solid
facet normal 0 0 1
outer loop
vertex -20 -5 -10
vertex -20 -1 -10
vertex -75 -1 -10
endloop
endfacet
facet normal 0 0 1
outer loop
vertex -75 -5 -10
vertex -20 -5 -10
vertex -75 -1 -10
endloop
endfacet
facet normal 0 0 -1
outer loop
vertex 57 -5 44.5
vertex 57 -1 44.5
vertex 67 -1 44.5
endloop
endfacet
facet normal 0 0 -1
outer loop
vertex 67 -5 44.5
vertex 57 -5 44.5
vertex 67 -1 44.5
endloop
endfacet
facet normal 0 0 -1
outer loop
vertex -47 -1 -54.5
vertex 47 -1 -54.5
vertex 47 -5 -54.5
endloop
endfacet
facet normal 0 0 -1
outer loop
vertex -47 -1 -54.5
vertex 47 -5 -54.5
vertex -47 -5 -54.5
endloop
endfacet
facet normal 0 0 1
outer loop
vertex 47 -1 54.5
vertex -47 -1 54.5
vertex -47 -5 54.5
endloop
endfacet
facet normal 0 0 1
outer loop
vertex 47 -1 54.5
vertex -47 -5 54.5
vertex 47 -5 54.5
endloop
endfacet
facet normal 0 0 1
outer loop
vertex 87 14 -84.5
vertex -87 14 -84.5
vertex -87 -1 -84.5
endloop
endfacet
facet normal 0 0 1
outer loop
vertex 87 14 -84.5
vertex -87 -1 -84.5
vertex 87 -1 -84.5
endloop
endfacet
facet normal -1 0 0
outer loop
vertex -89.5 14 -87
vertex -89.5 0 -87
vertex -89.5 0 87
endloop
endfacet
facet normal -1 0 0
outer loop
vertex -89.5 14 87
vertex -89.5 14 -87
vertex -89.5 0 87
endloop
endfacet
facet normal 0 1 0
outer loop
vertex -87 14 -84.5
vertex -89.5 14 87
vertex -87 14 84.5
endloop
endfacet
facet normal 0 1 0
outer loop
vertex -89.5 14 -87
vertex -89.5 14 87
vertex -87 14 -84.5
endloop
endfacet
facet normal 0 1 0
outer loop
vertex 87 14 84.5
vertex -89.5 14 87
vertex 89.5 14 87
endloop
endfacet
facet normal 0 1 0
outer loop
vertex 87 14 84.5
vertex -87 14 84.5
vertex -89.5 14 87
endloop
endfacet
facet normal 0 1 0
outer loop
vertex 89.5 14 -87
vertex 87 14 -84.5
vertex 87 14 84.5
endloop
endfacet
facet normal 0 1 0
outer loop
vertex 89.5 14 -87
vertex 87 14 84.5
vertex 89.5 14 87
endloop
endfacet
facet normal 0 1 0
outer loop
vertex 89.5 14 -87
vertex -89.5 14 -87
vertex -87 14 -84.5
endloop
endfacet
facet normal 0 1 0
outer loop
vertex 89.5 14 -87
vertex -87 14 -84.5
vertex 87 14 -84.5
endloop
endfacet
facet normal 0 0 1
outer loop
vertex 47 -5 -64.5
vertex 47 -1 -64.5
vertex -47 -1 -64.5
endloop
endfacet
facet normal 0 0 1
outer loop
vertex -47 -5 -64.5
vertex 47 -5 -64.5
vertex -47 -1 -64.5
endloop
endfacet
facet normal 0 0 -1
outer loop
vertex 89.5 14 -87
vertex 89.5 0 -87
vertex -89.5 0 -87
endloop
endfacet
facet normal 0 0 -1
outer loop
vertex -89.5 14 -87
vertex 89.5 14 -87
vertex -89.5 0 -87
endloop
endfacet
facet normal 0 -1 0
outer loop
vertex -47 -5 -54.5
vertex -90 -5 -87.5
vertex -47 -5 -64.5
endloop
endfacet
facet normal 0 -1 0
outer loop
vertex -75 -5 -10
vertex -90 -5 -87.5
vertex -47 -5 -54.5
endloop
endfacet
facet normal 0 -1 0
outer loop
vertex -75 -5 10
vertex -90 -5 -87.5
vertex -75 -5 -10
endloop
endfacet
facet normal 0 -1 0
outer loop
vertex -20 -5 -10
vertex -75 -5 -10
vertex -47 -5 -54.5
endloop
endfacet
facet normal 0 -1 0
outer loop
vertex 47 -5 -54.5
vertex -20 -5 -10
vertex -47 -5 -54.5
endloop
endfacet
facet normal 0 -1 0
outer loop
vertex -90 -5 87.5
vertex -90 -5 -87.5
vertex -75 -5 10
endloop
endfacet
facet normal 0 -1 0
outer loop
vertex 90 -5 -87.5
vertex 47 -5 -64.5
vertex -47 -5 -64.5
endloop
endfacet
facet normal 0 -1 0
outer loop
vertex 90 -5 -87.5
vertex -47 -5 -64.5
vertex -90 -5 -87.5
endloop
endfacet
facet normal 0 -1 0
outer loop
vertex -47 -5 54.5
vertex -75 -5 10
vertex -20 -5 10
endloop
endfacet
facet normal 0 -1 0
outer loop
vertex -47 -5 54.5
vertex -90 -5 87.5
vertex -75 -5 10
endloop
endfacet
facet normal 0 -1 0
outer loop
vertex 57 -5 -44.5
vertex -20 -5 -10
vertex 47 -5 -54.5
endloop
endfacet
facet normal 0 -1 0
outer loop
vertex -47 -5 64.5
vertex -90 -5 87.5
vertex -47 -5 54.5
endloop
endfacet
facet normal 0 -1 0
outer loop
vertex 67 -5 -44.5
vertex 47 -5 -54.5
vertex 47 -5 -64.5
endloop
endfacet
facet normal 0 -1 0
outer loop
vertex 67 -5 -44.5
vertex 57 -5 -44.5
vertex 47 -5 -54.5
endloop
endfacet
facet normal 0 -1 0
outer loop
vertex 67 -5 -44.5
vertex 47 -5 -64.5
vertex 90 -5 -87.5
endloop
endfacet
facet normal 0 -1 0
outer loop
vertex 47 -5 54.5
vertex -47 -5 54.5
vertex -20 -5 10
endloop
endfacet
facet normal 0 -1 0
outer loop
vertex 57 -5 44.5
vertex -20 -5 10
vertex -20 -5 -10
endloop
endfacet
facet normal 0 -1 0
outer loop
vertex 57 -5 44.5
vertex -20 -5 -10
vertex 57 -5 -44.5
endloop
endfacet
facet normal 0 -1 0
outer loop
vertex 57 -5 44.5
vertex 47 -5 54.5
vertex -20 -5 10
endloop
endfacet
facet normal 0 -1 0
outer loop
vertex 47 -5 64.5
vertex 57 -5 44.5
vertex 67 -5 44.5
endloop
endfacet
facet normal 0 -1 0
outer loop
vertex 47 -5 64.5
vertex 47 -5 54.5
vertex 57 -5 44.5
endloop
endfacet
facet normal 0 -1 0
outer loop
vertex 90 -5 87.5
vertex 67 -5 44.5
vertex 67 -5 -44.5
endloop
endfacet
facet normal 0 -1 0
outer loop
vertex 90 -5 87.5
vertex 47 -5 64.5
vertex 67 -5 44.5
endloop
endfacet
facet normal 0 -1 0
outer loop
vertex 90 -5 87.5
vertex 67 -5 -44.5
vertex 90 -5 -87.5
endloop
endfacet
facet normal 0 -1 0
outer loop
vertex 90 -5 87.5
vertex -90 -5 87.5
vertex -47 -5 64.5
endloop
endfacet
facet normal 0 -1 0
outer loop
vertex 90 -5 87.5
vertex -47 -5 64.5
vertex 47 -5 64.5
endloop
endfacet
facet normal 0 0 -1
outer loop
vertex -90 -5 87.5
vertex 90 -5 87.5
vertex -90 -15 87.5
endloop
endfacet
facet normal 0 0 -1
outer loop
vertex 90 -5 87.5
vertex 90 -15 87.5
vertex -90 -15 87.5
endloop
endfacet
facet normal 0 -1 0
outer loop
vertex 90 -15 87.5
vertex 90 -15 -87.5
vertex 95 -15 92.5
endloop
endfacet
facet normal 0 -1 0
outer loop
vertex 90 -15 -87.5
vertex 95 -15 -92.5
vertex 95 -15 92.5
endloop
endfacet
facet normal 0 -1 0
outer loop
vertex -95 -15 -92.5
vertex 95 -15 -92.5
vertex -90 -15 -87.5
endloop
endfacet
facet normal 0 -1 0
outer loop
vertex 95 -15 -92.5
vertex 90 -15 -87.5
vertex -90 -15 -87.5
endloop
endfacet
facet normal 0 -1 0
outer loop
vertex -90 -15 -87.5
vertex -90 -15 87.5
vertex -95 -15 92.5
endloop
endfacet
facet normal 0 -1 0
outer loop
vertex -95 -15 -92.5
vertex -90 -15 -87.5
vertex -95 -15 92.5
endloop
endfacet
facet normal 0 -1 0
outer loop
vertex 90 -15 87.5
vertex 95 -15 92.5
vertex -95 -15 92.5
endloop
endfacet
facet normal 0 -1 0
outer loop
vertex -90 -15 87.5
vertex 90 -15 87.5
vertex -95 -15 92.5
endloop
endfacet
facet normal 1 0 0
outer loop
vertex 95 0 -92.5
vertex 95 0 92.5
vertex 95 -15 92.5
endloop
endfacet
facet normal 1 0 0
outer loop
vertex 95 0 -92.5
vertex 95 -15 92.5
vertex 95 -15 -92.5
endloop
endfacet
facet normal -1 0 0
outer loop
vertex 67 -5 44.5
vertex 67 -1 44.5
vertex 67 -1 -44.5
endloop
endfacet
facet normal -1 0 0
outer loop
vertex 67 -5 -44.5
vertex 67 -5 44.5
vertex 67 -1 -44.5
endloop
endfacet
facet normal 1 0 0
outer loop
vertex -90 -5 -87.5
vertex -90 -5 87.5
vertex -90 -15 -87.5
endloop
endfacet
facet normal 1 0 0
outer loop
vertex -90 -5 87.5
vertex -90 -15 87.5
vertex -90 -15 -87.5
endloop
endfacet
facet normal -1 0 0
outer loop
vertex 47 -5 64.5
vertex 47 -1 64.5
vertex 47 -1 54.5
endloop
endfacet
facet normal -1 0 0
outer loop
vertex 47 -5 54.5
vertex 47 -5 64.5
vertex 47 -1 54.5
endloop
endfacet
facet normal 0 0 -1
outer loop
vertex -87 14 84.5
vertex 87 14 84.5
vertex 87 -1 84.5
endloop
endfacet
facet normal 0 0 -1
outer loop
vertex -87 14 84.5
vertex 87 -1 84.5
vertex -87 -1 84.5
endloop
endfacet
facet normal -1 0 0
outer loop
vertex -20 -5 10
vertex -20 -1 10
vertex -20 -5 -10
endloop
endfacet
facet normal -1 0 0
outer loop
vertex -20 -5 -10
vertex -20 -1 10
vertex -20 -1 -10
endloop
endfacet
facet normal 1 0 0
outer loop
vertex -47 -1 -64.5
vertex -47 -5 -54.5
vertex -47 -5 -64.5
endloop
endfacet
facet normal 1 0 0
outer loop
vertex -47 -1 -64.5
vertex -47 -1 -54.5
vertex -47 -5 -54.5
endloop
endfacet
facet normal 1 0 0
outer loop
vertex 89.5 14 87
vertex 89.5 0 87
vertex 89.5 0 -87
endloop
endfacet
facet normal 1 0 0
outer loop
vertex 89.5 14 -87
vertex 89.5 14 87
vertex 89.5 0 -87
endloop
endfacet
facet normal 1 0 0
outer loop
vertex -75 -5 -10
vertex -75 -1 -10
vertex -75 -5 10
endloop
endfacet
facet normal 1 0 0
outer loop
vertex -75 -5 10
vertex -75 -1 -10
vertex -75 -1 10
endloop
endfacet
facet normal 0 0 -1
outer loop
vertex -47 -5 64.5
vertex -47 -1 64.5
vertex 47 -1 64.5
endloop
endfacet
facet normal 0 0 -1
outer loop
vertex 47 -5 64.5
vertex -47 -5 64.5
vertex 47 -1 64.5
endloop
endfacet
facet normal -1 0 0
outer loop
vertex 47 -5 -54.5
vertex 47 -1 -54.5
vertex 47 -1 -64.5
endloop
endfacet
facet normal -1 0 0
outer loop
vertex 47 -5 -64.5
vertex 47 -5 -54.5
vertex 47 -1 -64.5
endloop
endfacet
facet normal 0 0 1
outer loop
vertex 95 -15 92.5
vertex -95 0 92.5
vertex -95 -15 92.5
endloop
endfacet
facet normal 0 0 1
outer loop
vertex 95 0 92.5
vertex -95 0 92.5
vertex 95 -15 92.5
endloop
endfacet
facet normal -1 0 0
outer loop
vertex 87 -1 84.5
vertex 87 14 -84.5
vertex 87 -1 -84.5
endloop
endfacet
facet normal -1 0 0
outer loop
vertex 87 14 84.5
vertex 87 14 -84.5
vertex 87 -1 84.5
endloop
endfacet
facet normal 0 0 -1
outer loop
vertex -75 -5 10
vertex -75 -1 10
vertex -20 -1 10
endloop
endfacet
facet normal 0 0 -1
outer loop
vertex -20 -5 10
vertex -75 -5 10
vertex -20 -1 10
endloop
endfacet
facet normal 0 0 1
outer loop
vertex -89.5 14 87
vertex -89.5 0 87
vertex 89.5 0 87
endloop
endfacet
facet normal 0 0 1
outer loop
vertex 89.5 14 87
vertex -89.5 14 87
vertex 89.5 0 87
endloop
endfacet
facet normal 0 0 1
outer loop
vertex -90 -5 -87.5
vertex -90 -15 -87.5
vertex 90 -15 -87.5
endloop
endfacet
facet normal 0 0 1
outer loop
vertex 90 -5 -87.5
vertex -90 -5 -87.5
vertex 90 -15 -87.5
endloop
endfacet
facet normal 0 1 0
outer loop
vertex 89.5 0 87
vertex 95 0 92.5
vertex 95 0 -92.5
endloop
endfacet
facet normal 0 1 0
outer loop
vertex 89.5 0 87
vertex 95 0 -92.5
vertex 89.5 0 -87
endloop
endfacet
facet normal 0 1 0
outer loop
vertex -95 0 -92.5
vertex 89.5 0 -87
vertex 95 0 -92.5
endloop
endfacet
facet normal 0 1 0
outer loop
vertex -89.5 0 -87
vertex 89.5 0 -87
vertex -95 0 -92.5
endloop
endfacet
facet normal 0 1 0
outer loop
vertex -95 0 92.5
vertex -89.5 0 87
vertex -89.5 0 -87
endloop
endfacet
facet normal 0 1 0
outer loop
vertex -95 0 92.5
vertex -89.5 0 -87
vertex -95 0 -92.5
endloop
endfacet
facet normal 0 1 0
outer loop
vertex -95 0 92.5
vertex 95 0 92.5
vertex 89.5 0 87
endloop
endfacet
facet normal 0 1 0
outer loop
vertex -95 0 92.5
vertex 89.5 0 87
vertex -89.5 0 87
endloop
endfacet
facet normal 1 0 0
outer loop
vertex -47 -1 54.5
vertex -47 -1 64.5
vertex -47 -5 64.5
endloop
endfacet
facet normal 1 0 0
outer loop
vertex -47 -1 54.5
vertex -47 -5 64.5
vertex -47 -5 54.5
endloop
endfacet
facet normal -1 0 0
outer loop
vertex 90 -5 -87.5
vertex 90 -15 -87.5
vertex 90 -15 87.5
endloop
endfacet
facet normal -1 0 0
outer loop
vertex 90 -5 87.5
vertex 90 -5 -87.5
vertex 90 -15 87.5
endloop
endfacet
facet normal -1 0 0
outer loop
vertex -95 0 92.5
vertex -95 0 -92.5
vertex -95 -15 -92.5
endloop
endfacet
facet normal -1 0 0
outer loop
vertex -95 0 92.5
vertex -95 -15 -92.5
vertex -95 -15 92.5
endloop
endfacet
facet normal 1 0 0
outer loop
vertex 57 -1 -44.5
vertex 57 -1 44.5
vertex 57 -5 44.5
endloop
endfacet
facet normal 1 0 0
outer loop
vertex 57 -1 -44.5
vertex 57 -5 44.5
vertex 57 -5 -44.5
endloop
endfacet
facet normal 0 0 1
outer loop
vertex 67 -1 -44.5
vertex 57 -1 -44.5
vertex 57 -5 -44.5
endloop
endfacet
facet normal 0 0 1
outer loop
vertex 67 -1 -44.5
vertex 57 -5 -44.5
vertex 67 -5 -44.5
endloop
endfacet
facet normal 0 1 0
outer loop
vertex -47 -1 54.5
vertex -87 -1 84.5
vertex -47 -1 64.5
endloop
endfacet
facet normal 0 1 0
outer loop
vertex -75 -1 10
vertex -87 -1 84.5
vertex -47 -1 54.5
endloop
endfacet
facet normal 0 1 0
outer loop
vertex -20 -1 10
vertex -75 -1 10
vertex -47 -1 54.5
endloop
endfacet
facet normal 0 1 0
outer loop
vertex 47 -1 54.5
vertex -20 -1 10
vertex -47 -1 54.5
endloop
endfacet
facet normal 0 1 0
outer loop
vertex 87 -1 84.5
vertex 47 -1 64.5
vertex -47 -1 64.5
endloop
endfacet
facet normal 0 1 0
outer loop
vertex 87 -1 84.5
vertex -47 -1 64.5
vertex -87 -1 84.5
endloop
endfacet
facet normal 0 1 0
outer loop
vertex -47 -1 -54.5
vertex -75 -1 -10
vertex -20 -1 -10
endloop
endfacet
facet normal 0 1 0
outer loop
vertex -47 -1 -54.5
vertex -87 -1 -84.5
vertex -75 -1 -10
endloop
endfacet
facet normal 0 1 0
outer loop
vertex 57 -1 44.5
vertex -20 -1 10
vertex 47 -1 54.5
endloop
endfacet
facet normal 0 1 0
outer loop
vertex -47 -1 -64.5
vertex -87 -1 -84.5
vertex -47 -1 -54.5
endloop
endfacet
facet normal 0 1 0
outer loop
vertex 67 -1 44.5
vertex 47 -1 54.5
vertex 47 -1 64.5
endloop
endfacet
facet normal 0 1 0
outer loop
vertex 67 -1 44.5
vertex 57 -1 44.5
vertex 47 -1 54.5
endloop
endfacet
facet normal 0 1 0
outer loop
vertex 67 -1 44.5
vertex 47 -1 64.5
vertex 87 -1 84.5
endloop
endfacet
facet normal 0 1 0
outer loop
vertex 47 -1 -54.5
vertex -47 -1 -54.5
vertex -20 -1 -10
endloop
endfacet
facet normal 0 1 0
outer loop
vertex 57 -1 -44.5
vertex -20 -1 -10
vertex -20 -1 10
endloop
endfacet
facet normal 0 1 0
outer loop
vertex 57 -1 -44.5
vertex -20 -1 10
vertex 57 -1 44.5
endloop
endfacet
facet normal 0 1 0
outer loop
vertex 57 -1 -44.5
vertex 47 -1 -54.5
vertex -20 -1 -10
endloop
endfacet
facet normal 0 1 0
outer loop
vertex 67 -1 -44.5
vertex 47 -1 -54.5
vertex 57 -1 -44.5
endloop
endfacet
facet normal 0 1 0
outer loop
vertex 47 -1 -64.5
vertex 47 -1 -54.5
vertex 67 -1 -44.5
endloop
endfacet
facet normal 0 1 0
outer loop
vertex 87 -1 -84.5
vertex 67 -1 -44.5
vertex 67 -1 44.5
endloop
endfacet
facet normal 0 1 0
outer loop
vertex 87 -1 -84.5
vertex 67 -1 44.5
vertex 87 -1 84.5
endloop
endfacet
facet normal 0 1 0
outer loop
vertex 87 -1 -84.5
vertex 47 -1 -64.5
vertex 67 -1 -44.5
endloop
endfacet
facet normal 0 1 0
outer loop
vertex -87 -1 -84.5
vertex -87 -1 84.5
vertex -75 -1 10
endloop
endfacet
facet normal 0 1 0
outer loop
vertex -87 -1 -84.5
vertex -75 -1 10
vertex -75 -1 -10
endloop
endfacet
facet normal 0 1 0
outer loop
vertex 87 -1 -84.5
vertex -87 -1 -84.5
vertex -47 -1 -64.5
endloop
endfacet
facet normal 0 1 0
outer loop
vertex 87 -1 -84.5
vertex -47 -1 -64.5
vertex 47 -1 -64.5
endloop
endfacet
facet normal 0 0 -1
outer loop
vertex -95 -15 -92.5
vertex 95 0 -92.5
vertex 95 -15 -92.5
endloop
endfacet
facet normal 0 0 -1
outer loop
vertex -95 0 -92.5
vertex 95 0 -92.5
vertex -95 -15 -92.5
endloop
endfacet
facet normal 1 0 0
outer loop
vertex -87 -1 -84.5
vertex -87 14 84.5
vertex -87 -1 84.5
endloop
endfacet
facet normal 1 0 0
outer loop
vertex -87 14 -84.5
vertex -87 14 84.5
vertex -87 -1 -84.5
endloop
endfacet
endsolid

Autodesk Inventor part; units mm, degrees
ref_plane "YZ Plane" through (0, 0, 0) normal (1, 0, 0) x (0, 1, 0)
ref_plane "XZ Plane" through (0, 0, 0) normal (0, 1, 0) x (-1, 0, 0)
ref_plane "XY Plane" through (0, 0, 0) normal (0, 0, 1) x (1, 0, 0)
sketch "Sketch1" plane through (0, 0, 0) normal (0, 1, 0) x (-1, 0, 0)
  line L0 (95, 92.5) -> (-95, 92.5)
  line L1 (-95, 92.5) -> (-95, -92.5)
  line L2 (-95, -92.5) -> (95, -92.5)
  line L3 (95, -92.5) -> (95, 92.5)
  point P0 (0, 0)
  dimension "d0" = 190
  dimension "d1" = 185
  dimension "d2" = 92.5
  dimension "d3" = 95
extrude "Extrusion1" add sketch "Sketch1" against normal blind 15
sketch "Sketch5" plane through (0, 0, 0) normal (0, 1, 0) x (1, 0, 0)
  line L0 (-95, -92.5) -> (95, -92.5) projected
  line L1 (95, -92.5) -> (95, 92.5) projected
  line L2 (95, 92.5) -> (-95, 92.5) projected
  line L3 (-95, 92.5) -> (-95, -92.5) projected
  line L4 (-89.5, -87) -> (89.5, -87)
  line L5 (89.5, -87) -> (89.5, 87)
  line L6 (89.5, 87) -> (-89.5, 87)
  line L7 (-89.5, 87) -> (-89.5, -87)
  point P0 (0, 0)
  dimension "d42" = 5.5
  dimension "d43" = 5.5
  dimension "d44" = 5.5
  dimension "d45" = 5.5
extrude "Extrusion6" add sketch "Sketch5" along normal blind 14 contours L7 L6 L5 L4
sketch "Sketch6" plane through (0, 14, 0) normal (0, 1, 0) x (1, 0, 0)
  line L0 (-89.5, -87) -> (89.5, -87) projected
  line L1 (89.5, -87) -> (89.5, 87) projected
  line L2 (89.5, 87) -> (-89.5, 87) projected
  line L3 (-89.5, 87) -> (-89.5, -87) projected
  line L4 (87, -84.5) -> (-87, -84.5)
  line L5 (-87, -84.5) -> (-87, 84.5)
  line L6 (-87, 84.5) -> (87, 84.5)
  line L7 (87, 84.5) -> (87, -84.5)
  point P0 (0, 0)
  dimension "d48" = 2.5
  dimension "d49" = 2.5
  dimension "d50" = 2.5
  dimension "d51" = 2.5
extrude "Extrusion7" cut sketch "Sketch6" against normal blind 15 contours L4 L5 L6 L7
sketch "Sketch7" plane through (0, -15, 0) normal (0, -1, 0) x (1, 0, 0)
  line L0 (95, 92.5) -> (-95, 92.5) projected
  line L1 (-95, 92.5) -> (-95, -92.5) projected
  line L2 (-95, -92.5) -> (95, -92.5) projected
  line L3 (95, -92.5) -> (95, 92.5) projected
  line L4 (90, 87.5) -> (-90, 87.5)
  line L5 (-90, 87.5) -> (-90, -87.5)
  line L6 (-90, -87.5) -> (90, -87.5)
  line L7 (90, -87.5) -> (90, 87.5)
  point P0 (0, 0)
  dimension "d54" = 5
  dimension "d55" = 5
  dimension "d56" = 5
  dimension "d57" = 5
extrude "Extrusion8" cut sketch "Sketch7" against normal blind 10 contours L7 L6 L5 L4
sketch "Sketch8" plane through (0, -1, 0) normal (0, 1, 0) x (1, 0, 0)
  line L0 (87, -84.5) -> (-87, -84.5) projected
  line L1 (87, 84.5) -> (87, -84.5) projected
  line L2 (-87, 84.5) -> (87, 84.5) projected
  line L3 (-87, -84.5) -> (-87, 84.5) projected
  line L4 (-67, -64.5) -> (67, -64.5)
  line L5 (67, -64.5) -> (67, 64.5)
  line L6 (67, 64.5) -> (-67, 64.5)
  line L7 (-67, 64.5) -> (-67, -64.5)
  line L8 (-57, -54.5) -> (57, -54.5)
  line L9 (57, -54.5) -> (57, 54.5)
  line L10 (57, 54.5) -> (-57, 54.5)
  line L11 (-57, 54.5) -> (-57, -54.5)
  line L12 (-67, -44.5) -> (-57, -44.5)
  line L13 (-47, -64.5) -> (-47, -54.5)
  line L14 (-67, 44.5) -> (-57, 44.5)
  line L15 (-47, 54.5) -> (-47, 64.5)
  line L16 (47, -64.5) -> (47, -54.5)
  line L17 (57, -44.5) -> (67, -44.5)
  line L18 (47, 54.5) -> (47, 64.5)
  line L19 (57, 44.5) -> (67, 44.5)
  point P0 (0, 0)
  dimension "d60" = 20
  dimension "d61" = 20
  dimension "d62" = 20
  dimension "d63" = 20
  dimension "d64" = 10
  dimension "d65" = 10
  dimension "d66" = 10
  dimension "d67" = 10
  dimension "d68" = 20
  dimension "d69" = 20
  dimension "d70" = 20
  dimension "d71" = 20
  dimension "d72" = 20
  dimension "d73" = 20
  dimension "d74" = 20
  dimension "d75" = 20
extrude "Extrusion9" cut sketch "Sketch8" against normal through all contours L13 L8 L16 L4 | L17 L9 L19 L5 | L6 L18 L10 L15
sketch "Sketch9" plane through (0, -1, 0) normal (0, 1, 0) x (1, 0, 0)
  line L0 (47, -54.5) -> (47, -64.5) projected
  line L1 (47, -64.5) -> (-47, -64.5) projected
  line L2 (-47, -64.5) -> (-47, -54.5) projected
  line L3 (-47, -54.5) -> (47, -54.5) projected
  line L4 (67, 44.5) -> (67, -44.5) projected
  line L5 (67, -44.5) -> (57, -44.5) projected
  line L6 (57, -44.5) -> (57, 44.5) projected
  line L7 (57, 44.5) -> (67, 44.5) projected
  line L8 (47, 64.5) -> (47, 54.5) projected
  line L9 (47, 54.5) -> (-47, 54.5) projected
  line L10 (-47, 54.5) -> (-47, 64.5) projected
  line L11 (-47, 64.5) -> (47, 64.5) projected
  line L12 (87, -84.5) -> (-87, -84.5) projected
  line L13 (87, 84.5) -> (87, -84.5) projected
  line L14 (-87, 84.5) -> (87, 84.5) projected
  line L15 (-87, -84.5) -> (-87, 84.5) projected
  line L16 (-75, -10) -> (-20, -10)
  line L17 (-20, -10) -> (-20, 10)
  line L18 (-20, 10) -> (-75, 10)
  line L19 (-75, 10) -> (-75, -10)
  point P0 (0, 0)
  dimension "d78" = 55
  dimension "d79" = 20
  dimension "d80" = 20
  dimension "d81" = 10
extrude "Extrusion10" cut sketch "Sketch9" against normal through all contours L19 L18 L17 L16
equation "\"d2\" = 0.5 * d1"
equation "\"d3\" = 0.5 * d0"
equation "\"d43\" = d42"
equation "\"d44\" = d42"
equation "\"d45\" = d42"
equation "\"d49\" = d48"
equation "\"d50\" = d48"
equation "\"d51\" = d48"
equation "\"d55\" = d54"
equation "\"d56\" = d54"
equation "\"d57\" = d54"
equation "\"d61\" = d60"
equation "\"d62\" = d60"
equation "\"d63\" = d60"
equation "\"d65\" = d64"
equation "\"d66\" = d64"
equation "\"d67\" = d64"
equation "\"d68\" = d69"
equation "\"d70\" = d69"
equation "\"d71\" = d69"
equation "\"d72\" = d69"
equation "\"d73\" = d69"
equation "\"d74\" = d69"
equation "\"d75\" = d69"
equation "\"d81\" = 0.5 * d79"
properties part number "Platform"
